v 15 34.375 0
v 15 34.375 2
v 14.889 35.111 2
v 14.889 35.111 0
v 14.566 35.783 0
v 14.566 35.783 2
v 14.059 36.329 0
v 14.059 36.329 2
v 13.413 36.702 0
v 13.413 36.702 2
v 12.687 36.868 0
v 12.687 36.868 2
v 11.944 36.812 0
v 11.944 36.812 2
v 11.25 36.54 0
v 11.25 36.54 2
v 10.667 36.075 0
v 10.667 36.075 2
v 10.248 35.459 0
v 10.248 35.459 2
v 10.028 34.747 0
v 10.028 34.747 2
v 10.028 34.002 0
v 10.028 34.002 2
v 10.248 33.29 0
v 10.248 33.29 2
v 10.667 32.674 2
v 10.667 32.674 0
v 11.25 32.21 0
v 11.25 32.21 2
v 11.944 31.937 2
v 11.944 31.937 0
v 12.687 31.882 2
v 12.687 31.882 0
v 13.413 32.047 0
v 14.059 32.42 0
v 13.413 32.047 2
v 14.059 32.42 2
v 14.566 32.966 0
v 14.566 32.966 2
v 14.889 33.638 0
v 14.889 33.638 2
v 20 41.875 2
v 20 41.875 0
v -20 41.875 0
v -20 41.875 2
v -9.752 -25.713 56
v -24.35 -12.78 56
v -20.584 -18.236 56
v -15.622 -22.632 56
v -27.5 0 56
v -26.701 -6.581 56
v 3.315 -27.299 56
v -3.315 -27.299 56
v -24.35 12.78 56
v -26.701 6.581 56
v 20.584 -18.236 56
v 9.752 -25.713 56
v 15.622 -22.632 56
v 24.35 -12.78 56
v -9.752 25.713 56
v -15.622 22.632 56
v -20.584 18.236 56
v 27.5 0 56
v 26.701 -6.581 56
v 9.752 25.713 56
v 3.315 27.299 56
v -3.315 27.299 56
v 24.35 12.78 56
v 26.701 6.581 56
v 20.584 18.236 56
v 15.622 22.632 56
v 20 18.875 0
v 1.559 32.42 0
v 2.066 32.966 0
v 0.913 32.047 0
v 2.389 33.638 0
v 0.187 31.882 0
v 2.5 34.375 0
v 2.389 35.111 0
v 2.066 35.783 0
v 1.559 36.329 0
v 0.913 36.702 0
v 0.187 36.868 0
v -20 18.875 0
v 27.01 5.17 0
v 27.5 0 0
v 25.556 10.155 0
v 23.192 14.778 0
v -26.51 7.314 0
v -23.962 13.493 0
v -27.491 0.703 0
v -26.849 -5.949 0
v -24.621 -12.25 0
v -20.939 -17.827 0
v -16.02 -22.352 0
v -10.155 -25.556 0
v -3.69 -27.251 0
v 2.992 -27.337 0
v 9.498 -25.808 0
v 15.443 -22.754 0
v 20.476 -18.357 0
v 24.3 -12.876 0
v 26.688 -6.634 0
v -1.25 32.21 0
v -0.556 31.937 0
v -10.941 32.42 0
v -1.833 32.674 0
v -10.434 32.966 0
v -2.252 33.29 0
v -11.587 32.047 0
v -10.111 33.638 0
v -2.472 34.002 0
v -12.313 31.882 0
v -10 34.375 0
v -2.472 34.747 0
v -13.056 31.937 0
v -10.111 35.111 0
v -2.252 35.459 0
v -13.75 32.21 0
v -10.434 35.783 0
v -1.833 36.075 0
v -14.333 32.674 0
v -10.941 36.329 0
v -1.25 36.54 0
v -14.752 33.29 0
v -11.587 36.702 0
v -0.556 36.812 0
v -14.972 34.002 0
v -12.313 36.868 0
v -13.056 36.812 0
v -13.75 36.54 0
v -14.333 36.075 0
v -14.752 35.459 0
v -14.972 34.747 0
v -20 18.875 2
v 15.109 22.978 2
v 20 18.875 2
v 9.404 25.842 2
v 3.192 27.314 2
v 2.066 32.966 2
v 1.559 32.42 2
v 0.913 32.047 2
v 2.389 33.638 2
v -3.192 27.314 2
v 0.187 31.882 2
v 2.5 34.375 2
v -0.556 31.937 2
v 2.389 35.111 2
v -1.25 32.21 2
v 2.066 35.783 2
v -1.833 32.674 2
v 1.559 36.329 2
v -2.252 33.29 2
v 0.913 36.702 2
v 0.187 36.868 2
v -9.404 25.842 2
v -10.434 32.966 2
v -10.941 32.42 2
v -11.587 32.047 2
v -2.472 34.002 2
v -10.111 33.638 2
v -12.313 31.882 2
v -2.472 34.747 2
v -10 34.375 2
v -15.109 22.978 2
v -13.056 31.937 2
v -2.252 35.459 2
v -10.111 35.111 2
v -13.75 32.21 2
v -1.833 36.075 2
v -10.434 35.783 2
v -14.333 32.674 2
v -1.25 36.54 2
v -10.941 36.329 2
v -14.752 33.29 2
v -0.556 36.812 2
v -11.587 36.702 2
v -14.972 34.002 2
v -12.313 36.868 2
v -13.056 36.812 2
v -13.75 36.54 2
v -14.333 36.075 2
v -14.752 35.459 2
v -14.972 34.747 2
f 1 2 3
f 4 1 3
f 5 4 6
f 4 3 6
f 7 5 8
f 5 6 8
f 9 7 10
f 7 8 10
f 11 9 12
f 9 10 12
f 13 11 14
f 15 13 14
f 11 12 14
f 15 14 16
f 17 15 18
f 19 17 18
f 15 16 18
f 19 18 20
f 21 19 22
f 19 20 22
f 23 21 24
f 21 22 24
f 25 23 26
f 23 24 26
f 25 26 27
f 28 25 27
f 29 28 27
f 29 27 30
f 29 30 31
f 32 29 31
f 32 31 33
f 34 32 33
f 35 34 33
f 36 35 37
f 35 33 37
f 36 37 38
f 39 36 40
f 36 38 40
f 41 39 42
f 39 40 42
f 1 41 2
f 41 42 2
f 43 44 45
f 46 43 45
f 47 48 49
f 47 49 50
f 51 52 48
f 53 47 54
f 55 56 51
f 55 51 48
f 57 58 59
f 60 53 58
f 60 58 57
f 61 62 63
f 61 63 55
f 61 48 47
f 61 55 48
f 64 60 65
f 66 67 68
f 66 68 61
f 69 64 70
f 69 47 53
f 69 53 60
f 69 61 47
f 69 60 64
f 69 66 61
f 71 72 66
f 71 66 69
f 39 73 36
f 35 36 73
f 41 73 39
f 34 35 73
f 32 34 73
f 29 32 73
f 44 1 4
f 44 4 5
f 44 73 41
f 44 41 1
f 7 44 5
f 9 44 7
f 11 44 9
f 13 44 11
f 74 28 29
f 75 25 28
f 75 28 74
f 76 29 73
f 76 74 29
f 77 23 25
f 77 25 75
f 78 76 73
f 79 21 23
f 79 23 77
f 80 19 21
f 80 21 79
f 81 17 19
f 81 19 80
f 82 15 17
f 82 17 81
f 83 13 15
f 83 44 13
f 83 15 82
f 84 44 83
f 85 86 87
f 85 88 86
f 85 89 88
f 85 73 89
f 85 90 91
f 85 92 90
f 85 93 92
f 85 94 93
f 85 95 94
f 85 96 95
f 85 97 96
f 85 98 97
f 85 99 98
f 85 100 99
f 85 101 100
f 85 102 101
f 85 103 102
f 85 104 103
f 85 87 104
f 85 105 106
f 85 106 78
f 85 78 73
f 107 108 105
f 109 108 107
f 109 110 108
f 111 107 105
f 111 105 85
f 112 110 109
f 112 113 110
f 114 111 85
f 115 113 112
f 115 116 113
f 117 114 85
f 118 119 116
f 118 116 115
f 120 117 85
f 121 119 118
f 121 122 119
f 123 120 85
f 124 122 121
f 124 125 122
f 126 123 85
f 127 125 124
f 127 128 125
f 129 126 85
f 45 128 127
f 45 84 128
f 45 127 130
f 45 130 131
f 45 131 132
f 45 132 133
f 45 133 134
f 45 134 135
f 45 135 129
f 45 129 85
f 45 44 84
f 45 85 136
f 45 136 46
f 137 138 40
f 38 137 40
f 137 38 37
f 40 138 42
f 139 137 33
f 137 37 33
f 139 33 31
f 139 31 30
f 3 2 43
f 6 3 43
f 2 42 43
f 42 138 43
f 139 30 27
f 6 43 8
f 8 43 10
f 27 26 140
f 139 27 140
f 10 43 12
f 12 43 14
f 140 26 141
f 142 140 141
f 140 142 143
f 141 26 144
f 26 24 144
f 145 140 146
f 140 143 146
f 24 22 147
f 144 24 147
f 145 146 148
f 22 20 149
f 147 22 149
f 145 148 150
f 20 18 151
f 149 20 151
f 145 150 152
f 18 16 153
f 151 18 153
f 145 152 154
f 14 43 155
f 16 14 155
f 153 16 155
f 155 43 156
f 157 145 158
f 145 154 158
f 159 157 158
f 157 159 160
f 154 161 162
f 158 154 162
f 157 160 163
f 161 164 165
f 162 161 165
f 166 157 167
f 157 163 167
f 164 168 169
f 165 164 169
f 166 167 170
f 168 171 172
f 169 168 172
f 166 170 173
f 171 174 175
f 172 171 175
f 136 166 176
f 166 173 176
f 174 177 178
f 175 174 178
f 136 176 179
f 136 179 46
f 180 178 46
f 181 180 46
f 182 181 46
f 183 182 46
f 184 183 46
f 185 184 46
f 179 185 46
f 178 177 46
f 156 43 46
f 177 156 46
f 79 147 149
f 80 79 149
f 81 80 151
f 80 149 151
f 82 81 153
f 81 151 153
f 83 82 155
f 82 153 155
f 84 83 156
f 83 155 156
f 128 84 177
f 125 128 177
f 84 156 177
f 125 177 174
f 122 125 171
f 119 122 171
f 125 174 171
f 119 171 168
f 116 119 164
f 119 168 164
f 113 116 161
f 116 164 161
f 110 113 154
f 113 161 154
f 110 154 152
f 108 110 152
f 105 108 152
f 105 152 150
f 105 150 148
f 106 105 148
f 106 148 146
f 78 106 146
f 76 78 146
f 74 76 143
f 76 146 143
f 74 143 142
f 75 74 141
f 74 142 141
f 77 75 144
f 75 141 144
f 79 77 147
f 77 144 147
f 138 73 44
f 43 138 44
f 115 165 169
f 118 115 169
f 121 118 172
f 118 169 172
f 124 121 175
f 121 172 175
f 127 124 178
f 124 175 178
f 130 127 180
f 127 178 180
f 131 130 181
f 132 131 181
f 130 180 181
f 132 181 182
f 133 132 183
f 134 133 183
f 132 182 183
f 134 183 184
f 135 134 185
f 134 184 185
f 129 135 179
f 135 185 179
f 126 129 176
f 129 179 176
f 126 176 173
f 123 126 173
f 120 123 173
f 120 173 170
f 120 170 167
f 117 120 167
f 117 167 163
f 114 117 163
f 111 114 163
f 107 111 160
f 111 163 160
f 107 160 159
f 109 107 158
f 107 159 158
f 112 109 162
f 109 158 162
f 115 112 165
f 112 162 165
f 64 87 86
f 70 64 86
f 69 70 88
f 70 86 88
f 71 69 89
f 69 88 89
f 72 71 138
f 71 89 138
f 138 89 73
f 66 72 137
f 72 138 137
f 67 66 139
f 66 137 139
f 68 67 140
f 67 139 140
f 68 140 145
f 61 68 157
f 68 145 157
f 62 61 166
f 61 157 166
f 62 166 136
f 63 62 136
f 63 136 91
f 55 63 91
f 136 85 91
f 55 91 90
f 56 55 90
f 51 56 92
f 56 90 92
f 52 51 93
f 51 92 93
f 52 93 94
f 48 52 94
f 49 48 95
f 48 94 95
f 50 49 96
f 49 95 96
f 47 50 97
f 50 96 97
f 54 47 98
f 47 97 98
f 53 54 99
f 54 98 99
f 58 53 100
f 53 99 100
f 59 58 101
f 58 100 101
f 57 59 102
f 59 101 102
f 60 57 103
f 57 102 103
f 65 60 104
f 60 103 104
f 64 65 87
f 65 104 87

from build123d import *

# Parameters (mm, degrees)
SKETCH_1_R          = 27.5
EXTRUDE_1_DEPTH     = 56
SKETCH_2_W          = 40
SKETCH_2_H          = 23
EXTRUDE_2_DEPTH     = 2
SKETCH_3_R          = 2.5
CUT_EXTRUDE_1_DEPTH = 2


with BuildPart() as part:
    # 草图1 → 凸台-拉伸1 (new body)
    with BuildSketch(Plane.XY):
        Circle(SKETCH_1_R)
    extrude(amount=EXTRUDE_1_DEPTH)

    # 草图2 → 凸台-拉伸2 (add)
    with BuildSketch(Plane(origin=(0, 0, 0), x_dir=(-1, 0, 0), z_dir=(0, 0, -1))):
        with Locations((0, 30.374586088)):
            Rectangle(SKETCH_2_W, SKETCH_2_H)
    extrude(amount=-EXTRUDE_2_DEPTH)

    # 草图3 → 切除-拉伸1 (cut)
    with BuildSketch(Plane.XY.offset(2)):
        with Locations((0, 34.374586088)):
            Circle(SKETCH_3_R)
        with Locations((-12.5, 34.374586088)):
            Circle(SKETCH_3_R)
        with Locations((12.5, 34.374586088)):
            Circle(SKETCH_3_R)
    extrude(amount=-CUT_EXTRUDE_1_DEPTH, mode=Mode.SUBTRACT)


solid = part.part
